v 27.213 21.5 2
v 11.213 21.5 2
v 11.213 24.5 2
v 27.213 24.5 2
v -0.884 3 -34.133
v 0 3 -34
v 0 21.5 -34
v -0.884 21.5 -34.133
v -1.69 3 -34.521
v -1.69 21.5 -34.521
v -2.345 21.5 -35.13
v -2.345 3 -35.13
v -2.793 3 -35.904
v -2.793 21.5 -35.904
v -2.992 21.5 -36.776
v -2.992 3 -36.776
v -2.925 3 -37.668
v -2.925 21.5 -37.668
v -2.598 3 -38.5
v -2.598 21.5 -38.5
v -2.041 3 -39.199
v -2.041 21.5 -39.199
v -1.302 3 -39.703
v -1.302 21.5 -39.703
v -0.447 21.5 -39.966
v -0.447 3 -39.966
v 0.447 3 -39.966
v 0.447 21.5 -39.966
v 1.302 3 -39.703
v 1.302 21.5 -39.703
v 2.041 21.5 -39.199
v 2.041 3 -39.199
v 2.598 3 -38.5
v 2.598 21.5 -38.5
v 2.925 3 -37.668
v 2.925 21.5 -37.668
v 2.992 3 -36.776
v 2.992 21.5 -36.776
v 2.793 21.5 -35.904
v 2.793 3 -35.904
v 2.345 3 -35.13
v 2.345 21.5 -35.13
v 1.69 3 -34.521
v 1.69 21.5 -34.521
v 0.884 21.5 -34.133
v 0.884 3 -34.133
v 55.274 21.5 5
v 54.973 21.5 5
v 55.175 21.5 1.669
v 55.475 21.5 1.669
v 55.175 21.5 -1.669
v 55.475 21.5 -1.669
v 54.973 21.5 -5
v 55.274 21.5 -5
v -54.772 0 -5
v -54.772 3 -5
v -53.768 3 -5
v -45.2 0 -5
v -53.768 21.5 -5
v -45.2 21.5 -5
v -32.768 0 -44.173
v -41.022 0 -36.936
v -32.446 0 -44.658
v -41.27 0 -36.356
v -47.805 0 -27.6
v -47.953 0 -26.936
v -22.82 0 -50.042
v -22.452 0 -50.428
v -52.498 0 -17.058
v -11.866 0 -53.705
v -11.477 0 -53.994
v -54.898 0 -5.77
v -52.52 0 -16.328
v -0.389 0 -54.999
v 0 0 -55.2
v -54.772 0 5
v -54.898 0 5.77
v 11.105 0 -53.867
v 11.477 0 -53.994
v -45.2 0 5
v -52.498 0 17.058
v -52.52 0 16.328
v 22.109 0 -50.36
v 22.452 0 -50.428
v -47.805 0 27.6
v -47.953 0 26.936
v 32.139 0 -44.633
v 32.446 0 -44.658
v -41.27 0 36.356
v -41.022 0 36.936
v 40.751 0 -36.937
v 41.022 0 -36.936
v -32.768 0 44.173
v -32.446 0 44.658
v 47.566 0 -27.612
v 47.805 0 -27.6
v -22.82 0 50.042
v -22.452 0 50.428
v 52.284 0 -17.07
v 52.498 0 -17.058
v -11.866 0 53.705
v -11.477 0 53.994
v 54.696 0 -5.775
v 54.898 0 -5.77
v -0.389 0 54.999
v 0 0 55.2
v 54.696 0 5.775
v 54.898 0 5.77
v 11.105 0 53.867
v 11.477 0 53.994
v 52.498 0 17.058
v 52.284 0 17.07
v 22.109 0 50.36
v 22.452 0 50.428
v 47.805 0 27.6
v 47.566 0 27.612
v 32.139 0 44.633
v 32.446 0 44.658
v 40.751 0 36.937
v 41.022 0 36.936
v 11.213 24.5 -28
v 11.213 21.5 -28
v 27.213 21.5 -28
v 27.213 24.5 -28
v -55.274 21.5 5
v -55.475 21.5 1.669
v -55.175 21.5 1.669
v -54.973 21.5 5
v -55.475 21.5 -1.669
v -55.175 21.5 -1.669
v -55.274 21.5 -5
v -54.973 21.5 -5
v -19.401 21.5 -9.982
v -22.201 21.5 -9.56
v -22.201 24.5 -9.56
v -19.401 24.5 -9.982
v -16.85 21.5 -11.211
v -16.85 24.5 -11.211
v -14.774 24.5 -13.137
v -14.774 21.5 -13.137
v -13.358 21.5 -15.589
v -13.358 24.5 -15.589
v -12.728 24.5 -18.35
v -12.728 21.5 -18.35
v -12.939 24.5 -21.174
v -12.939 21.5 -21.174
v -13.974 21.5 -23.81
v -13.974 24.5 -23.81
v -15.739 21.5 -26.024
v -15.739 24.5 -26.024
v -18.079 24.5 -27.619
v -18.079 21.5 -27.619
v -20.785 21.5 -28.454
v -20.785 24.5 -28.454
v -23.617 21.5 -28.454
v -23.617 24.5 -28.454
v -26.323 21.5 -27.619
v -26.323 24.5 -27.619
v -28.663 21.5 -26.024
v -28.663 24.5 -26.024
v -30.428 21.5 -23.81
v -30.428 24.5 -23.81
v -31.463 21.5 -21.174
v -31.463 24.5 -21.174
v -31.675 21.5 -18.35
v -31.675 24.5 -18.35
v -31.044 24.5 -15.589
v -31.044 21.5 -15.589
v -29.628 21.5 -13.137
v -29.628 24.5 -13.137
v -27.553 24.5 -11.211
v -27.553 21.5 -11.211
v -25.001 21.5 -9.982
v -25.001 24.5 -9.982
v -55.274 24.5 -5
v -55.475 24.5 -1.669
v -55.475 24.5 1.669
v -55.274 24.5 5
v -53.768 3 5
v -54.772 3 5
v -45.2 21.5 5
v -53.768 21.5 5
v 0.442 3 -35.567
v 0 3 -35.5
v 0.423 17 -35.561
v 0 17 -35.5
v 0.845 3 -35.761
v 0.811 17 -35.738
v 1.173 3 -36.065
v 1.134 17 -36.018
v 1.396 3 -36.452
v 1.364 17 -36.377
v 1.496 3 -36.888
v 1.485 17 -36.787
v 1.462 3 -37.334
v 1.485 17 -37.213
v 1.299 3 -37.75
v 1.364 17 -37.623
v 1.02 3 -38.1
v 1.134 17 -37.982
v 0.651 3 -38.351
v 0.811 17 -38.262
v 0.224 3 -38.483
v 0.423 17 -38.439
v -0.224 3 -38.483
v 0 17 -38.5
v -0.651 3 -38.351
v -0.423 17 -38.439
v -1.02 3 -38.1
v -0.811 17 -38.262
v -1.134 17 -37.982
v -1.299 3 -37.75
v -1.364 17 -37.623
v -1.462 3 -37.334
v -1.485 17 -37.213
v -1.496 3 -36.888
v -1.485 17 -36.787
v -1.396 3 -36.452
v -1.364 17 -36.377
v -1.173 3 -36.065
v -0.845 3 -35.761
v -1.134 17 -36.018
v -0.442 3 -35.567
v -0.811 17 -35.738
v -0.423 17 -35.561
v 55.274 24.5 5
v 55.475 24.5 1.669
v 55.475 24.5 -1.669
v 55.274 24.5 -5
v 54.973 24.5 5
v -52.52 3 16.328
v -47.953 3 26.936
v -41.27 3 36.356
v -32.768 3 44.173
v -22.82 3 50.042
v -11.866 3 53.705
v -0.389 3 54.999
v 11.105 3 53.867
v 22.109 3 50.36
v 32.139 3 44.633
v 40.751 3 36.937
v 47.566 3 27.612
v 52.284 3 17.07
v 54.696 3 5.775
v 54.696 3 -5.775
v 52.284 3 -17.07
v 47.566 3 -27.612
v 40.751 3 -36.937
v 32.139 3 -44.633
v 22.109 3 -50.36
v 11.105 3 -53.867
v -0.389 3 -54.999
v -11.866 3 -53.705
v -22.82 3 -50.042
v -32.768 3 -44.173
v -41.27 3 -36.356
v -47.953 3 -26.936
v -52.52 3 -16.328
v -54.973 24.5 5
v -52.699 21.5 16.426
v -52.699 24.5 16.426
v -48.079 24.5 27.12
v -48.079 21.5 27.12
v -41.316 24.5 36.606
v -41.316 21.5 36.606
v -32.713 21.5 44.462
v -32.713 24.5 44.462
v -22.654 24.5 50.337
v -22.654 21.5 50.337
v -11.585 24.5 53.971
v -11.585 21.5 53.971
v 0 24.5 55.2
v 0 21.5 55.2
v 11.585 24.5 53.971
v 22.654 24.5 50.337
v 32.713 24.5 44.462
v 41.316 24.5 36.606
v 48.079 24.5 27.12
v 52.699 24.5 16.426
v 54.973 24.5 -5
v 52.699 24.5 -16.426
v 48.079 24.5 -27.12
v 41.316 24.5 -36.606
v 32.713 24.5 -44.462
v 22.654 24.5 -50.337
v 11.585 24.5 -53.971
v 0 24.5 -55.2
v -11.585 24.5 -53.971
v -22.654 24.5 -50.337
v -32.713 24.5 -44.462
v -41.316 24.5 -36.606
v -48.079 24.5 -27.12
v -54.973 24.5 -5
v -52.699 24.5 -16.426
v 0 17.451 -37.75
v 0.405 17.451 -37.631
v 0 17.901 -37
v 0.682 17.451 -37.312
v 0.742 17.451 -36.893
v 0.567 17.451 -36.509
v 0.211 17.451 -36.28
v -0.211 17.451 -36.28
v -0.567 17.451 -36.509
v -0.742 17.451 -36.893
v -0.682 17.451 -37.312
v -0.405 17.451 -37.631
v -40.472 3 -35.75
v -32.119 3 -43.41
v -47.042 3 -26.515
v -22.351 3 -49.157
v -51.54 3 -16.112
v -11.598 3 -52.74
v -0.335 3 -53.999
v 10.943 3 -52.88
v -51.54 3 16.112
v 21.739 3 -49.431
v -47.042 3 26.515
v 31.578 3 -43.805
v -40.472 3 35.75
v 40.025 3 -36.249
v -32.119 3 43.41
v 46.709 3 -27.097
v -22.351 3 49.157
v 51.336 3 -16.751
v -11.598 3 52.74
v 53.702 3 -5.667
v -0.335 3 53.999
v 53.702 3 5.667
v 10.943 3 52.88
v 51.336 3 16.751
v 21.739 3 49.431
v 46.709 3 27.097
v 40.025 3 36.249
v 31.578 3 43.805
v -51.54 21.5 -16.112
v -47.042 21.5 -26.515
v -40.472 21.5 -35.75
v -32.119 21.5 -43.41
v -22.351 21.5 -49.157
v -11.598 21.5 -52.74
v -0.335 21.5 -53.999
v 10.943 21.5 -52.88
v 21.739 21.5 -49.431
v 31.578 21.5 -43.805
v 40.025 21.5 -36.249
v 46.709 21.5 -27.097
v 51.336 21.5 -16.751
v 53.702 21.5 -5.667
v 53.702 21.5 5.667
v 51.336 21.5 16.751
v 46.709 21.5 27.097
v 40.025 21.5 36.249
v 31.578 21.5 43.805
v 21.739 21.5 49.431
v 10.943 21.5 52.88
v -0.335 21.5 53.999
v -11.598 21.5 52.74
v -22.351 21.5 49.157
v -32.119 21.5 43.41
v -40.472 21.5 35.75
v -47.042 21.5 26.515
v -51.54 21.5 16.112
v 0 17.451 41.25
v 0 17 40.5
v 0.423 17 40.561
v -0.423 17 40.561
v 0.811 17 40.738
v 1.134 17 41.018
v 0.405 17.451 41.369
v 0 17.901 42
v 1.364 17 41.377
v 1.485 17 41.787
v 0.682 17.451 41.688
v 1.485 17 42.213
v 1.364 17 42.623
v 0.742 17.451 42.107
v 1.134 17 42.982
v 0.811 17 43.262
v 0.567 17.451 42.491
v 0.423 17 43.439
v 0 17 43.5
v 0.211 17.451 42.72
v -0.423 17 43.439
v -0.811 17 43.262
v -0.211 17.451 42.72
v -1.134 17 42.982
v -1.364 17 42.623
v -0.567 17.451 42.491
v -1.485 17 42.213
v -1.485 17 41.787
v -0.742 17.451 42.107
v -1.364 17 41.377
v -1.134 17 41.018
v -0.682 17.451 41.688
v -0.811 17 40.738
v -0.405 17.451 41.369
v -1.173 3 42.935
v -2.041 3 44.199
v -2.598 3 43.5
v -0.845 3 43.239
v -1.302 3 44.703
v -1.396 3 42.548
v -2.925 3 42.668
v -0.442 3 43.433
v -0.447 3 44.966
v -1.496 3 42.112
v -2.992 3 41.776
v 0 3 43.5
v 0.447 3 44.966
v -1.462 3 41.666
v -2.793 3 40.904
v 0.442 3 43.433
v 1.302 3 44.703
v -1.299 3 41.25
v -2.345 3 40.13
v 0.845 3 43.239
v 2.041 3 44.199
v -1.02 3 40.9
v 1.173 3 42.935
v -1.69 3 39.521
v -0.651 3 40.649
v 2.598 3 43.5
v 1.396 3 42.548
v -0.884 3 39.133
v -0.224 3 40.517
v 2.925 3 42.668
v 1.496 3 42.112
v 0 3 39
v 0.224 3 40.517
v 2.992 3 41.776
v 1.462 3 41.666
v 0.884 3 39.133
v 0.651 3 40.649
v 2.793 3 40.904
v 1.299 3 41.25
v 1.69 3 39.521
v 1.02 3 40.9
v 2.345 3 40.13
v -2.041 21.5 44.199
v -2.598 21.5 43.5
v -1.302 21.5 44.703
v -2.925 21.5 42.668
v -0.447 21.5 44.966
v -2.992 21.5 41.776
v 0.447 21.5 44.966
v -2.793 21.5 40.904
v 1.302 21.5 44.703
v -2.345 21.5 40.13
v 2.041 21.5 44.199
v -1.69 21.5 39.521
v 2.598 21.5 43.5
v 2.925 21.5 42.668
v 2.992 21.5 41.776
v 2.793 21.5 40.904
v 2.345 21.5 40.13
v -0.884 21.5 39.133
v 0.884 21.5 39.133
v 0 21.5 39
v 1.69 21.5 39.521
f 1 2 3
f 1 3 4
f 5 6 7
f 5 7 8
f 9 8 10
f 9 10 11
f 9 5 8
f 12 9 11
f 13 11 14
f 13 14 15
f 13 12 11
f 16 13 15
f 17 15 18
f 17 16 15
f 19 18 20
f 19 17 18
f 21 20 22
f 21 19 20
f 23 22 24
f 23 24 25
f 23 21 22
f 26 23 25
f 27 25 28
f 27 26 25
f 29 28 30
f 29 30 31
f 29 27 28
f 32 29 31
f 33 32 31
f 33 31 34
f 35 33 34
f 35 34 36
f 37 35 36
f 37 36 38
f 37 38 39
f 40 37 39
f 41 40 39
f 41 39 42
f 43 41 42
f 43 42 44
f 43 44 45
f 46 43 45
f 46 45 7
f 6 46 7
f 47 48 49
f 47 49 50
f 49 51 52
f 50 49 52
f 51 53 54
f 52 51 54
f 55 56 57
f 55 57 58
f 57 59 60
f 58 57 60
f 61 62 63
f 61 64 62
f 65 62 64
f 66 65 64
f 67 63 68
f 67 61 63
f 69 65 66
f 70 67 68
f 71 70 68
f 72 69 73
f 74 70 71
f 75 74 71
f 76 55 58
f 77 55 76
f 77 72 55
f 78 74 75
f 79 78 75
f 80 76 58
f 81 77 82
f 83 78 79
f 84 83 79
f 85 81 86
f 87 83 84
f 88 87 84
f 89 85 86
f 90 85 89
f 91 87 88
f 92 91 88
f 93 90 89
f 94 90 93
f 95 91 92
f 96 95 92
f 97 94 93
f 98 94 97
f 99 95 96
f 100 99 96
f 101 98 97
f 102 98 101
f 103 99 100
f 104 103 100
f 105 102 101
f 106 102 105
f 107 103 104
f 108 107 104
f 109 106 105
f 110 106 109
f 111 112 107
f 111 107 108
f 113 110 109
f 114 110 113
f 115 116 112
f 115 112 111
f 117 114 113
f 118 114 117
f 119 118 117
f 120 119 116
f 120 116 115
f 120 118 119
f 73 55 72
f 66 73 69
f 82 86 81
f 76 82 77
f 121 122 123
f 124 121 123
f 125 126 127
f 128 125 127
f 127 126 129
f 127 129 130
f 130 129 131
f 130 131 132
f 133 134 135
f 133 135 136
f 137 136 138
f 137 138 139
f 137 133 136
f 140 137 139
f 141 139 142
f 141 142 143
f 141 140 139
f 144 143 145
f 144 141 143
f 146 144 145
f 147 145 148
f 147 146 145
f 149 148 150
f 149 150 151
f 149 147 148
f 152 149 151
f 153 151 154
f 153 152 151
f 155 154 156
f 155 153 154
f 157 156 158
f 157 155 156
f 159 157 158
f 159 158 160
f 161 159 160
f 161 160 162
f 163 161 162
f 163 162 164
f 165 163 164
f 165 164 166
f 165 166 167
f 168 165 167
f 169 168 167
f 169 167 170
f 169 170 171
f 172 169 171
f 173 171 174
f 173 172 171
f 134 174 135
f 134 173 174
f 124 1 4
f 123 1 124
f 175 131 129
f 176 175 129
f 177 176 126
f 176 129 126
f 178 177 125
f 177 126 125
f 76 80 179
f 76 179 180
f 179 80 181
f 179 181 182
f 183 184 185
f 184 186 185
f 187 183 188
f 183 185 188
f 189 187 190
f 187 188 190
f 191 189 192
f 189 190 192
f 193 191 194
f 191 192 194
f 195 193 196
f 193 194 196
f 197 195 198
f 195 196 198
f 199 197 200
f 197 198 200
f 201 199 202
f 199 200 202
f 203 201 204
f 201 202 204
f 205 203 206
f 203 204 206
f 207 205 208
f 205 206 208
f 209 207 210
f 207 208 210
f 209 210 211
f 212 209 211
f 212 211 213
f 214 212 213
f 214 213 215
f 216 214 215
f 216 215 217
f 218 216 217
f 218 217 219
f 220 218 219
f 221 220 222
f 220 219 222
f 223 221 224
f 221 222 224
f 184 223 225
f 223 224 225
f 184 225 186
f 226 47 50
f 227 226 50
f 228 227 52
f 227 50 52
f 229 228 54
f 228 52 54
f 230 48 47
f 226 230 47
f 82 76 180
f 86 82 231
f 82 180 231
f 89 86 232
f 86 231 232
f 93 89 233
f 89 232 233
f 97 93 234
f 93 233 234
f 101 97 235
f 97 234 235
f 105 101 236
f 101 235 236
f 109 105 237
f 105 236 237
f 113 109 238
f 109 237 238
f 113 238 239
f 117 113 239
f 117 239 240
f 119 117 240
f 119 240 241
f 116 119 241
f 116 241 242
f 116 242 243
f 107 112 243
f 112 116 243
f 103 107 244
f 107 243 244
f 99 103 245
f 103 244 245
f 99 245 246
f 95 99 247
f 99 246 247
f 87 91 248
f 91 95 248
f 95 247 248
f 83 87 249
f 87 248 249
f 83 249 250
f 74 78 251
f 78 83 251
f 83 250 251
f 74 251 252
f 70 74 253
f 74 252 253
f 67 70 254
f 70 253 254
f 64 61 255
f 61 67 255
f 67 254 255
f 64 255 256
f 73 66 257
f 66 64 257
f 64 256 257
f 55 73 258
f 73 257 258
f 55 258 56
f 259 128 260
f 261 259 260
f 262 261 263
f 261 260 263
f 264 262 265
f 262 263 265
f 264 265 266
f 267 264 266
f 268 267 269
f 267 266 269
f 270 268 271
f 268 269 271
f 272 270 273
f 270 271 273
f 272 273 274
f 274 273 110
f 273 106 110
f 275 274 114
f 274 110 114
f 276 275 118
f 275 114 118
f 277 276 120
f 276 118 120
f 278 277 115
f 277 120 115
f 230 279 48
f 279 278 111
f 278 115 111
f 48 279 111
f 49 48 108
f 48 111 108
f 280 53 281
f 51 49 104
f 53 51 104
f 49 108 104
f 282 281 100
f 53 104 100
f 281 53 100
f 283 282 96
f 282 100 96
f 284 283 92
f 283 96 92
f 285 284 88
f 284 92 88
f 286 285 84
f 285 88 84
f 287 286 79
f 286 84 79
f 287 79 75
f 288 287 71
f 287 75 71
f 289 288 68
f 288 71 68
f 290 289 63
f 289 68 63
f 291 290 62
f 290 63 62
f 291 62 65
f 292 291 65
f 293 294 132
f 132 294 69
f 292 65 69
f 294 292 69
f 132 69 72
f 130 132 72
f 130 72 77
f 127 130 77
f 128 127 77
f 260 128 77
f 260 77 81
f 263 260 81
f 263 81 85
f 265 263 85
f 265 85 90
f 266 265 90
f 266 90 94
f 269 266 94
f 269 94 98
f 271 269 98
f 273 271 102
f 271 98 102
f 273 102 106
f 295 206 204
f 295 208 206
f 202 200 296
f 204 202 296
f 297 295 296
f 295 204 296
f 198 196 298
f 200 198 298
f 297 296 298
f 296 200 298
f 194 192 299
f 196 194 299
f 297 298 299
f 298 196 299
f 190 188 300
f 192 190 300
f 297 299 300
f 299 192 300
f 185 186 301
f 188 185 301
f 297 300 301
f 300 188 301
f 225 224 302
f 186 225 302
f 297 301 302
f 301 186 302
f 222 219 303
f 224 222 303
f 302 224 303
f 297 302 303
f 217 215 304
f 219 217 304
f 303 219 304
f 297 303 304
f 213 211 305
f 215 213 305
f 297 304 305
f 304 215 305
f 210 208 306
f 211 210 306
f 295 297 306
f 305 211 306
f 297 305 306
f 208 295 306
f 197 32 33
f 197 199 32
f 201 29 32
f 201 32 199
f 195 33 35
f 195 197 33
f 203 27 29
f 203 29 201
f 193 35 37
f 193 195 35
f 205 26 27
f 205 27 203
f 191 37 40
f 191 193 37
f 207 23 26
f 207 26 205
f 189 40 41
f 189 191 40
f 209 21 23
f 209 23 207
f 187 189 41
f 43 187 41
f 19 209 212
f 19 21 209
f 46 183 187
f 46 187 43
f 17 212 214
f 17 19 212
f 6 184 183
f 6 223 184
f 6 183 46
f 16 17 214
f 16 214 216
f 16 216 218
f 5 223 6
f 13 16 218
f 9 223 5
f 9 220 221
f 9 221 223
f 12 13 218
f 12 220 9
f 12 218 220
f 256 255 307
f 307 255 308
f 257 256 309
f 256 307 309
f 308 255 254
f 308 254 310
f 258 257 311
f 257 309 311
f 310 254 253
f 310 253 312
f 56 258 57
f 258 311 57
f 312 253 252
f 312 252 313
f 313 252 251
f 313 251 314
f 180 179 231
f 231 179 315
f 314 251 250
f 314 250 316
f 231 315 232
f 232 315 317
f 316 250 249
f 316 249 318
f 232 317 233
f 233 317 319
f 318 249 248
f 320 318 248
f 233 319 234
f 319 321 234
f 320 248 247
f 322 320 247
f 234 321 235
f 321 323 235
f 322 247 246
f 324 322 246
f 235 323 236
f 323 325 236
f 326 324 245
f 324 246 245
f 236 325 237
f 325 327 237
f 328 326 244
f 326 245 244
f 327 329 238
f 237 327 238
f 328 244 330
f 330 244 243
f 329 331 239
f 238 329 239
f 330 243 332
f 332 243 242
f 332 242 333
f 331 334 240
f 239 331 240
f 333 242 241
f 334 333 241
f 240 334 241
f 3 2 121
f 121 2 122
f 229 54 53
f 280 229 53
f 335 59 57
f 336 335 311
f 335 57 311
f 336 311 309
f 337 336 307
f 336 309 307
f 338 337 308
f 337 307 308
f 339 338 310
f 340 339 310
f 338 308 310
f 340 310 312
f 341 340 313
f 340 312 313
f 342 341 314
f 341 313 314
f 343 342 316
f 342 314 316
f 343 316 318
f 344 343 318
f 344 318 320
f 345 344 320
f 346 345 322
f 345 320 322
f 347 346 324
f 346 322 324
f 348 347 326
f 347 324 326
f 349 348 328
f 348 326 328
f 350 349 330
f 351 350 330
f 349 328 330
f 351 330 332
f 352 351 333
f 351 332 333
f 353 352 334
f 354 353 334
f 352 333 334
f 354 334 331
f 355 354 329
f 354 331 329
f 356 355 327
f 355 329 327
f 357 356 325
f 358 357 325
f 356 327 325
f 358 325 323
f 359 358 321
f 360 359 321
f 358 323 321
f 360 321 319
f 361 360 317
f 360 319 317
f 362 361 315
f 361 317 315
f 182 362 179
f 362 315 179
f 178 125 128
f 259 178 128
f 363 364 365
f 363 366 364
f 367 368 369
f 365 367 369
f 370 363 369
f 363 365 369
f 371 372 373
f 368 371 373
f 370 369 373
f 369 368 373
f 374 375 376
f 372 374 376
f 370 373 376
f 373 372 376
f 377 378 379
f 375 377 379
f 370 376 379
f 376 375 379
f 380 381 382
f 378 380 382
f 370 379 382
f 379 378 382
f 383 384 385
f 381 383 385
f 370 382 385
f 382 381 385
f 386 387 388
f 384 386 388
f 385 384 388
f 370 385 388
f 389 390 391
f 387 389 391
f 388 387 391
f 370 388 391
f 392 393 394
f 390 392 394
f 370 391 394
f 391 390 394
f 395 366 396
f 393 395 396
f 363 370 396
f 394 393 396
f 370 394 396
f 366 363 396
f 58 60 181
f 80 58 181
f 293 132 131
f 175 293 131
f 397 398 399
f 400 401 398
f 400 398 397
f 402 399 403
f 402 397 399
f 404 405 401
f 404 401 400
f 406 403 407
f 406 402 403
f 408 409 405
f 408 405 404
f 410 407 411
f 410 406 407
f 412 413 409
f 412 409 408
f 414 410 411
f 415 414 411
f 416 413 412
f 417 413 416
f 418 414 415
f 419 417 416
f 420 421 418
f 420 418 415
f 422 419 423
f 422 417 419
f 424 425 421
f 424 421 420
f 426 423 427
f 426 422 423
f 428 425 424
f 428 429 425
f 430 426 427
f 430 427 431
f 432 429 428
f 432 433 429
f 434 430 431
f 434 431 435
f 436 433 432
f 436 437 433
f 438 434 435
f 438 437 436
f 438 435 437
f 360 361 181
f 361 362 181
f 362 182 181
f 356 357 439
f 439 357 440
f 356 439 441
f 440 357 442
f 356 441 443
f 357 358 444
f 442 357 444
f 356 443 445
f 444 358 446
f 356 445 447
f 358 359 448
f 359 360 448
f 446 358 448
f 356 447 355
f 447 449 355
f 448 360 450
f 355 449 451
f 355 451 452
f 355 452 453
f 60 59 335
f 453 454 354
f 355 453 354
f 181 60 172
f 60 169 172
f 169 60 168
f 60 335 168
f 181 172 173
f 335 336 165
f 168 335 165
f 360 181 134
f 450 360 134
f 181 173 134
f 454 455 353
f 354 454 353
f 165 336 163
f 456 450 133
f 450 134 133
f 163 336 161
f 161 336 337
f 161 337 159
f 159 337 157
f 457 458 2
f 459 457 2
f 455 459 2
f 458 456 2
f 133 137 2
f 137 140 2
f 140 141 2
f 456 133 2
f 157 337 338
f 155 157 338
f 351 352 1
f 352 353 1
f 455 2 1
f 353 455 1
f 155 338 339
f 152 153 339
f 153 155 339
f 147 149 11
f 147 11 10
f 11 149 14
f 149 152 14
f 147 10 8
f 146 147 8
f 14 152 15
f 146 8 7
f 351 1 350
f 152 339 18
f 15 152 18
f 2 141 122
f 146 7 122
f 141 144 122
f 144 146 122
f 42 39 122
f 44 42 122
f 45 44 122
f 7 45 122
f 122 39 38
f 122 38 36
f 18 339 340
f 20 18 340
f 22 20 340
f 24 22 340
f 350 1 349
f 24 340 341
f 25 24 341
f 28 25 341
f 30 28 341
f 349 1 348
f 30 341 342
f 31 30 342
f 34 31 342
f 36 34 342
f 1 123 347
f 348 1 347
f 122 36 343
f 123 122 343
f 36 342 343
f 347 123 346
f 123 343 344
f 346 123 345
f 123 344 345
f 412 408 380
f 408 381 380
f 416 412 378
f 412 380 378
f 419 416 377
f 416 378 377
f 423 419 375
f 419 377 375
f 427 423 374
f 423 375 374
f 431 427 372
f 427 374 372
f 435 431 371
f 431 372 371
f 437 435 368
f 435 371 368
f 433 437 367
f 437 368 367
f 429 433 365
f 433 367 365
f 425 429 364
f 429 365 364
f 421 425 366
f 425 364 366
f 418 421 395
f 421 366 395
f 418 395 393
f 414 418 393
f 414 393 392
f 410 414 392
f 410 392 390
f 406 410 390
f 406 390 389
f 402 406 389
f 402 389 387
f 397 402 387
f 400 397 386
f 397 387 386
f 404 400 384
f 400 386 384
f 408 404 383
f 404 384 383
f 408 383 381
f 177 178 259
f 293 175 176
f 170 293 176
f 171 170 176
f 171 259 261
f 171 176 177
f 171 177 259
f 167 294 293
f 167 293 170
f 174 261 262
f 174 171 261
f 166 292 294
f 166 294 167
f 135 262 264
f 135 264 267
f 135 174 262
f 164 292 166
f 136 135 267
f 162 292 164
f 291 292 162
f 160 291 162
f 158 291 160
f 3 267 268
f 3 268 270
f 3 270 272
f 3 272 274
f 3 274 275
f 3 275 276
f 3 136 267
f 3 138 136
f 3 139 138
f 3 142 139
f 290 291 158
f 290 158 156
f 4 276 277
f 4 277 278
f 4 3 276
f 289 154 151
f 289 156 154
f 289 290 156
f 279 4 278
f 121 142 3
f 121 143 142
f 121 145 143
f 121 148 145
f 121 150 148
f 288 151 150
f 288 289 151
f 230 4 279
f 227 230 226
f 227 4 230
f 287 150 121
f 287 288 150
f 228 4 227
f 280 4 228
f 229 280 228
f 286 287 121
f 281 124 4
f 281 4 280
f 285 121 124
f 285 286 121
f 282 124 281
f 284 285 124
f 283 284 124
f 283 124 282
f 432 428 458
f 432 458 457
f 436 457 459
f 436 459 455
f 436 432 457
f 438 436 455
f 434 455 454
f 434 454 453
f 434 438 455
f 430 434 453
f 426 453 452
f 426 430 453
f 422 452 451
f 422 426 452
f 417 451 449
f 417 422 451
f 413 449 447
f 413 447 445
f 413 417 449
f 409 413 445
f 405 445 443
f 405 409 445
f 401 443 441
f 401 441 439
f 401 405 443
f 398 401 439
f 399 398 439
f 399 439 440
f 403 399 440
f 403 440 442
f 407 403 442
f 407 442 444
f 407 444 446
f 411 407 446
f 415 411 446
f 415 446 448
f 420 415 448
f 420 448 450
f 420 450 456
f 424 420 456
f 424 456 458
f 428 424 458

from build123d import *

# Parameters (mm, degrees)
SKETCH1_R                 = 55.2
BOSS_EXTRUDE1_DEPTH       = 3
SKETCH2_R                 = 55
CUT_EXTRUDE1_DEPTH        = 79.12221195
SKETCH4_R                 = 55.2
BOSS_EXTRUDE2_DEPTH       = 18.5
BOSS_EXTRUDE4_DEPTH       = 3
SKETCH6_R                 = 9.5
SKETCH6_W                 = 16
SKETCH6_H                 = 30
BOSS_EXTRUDE3_DEPTH       = 3
BOSS_EXTRUDE9_REACH       = 83.176
SKETCH15_R                = 3
F_3_0MM_DOWEL_HOLE2_D     = 3
F_3_0MM_DOWEL_HOLE2_DEPTH = 14
F_3_0MM_DOWEL_HOLE2_TIP   = 0.901290929


with BuildPart() as part:
    # Sketch1 → Boss-Extrude1 (new body)
    with BuildSketch(Plane(origin=(0, 0, 0), x_dir=(1, 0, 0), z_dir=(0, 1, 0))):
        with Locations(Location((0, 0, 0), (0, 0, 270))):
            Circle(SKETCH1_R)
    extrude(amount=BOSS_EXTRUDE1_DEPTH)

    # Sketch2 → Cut-Extrude1 (cut, through all)
    with BuildSketch(Plane(origin=(0, 3, 0), x_dir=(1, 0, 0), z_dir=(0, 1, 0))):
        with Locations(Location((0, 0, 0), (0, 0, 270))):
            Circle(SKETCH2_R)
    extrude(amount=-CUT_EXTRUDE1_DEPTH, mode=Mode.SUBTRACT)

    # Sketch4 → Boss-Extrude2 (add)
    with BuildSketch(Plane(origin=(0, 3, 0), x_dir=(1, 0, 0), z_dir=(0, 1, 0))):
        with Locations(Location((0, 0, 0), (0, 0, 270))):
            Circle(SKETCH4_R)
        with BuildLine():
            Line((-45.2, -5), (-45.2, 5))
            Line((-45.2, 5), (-53.768020235, 5))
            ThreePointArc((-53.768020235, 5), (54, 0), (-53.768020235, -5))
            Line((-53.768020235, -5), (-45.2, -5))
        make_face(mode=Mode.SUBTRACT)
    extrude(amount=BOSS_EXTRUDE2_DEPTH)

    # Sketch8 → Boss-Extrude4 (add)
    with BuildSketch(Plane.XZ.offset(-3)):
        with BuildLine():
            Line((-45.2, 5), (-54.772255751, 5))
            ThreePointArc((-54.772255751, 5), (-55, 0), (-54.772255751, -5))
            Line((-54.772255751, -5), (-45.2, -5))
            Line((-45.2, -5), (-45.2, 5))
        make_face()
    extrude(amount=BOSS_EXTRUDE4_DEPTH)

    # Sketch6 → Boss-Extrude3 (add)
    with BuildSketch(Plane(origin=(0, 21.5, 0), x_dir=(1, 0, 0), z_dir=(0, 1, 0))):
        with BuildLine():
            Line((-55.274315916, -5), (-54.973084323, -5))
            ThreePointArc((-54.973084323, -5), (0, -55.2), (54.973084323, -5))
            Line((54.973084323, -5), (55.274315916, -5))
            ThreePointArc((55.274315916, -5), (55.5, 0), (55.274315916, 5))
            Line((55.274315916, 5), (54.973084323, 5))
            ThreePointArc((54.973084323, 5), (0, 55.2), (-54.973084323, 5))
            Line((-54.973084323, 5), (-55.274315916, 5))
            ThreePointArc((-55.274315916, 5), (-55.5, 0), (-55.274315916, -5))
        make_face()
        with Locations(Location((-22.20107336, 19.059873591, 0), (0, 0, 270))):
            Circle(SKETCH6_R, mode=Mode.SUBTRACT)
        with Locations((19.213108786, 13)):
            Rectangle(SKETCH6_W, SKETCH6_H, mode=Mode.SUBTRACT)
    extrude(amount=BOSS_EXTRUDE3_DEPTH)

    # Sketch15 → Boss-Extrude9 (add, up to next)
    with BuildSketch(Plane.XZ.offset(-3), mode=Mode.PRIVATE) as boss_extrude9_sk1:
        with Locations(Location((0, 42, 0), (0, 0, 270))):
            Circle(SKETCH15_R)
    boss_extrude9_tool1 = extrude(boss_extrude9_sk1.sketch, amount=-BOSS_EXTRUDE9_REACH, mode=Mode.PRIVATE) - part.part
    # Sketch15 → Boss-Extrude9 (add, up to next)
    with BuildSketch(Plane.XZ.offset(-3), mode=Mode.PRIVATE) as boss_extrude9_sk2:
        with Locations(Location((0, -37, 0), (0, 0, 90))):
            Circle(SKETCH15_R)
    boss_extrude9_tool2 = extrude(boss_extrude9_sk2.sketch, amount=-BOSS_EXTRUDE9_REACH, mode=Mode.PRIVATE) - part.part
    add(boss_extrude9_tool1.solids().sort_by_distance((0, 3, 42))[0])
    add(boss_extrude9_tool2.solids().sort_by_distance((0, 3, -37))[0])

    # Ø3.0mm Dowel Hole2
    with Locations(Plane(origin=(0, 3, 42), x_dir=(0, 0, -1), z_dir=(0, -1, 0))):
        with Locations((0, 0), (79, 0)):
            Hole(F_3_0MM_DOWEL_HOLE2_D / 2, depth=F_3_0MM_DOWEL_HOLE2_DEPTH)
            with Locations((0, 0, -(F_3_0MM_DOWEL_HOLE2_DEPTH + F_3_0MM_DOWEL_HOLE2_TIP / 2))):  # 118° drill point
                Cone(0, F_3_0MM_DOWEL_HOLE2_D / 2, F_3_0MM_DOWEL_HOLE2_TIP, mode=Mode.SUBTRACT)


solid = part.part
